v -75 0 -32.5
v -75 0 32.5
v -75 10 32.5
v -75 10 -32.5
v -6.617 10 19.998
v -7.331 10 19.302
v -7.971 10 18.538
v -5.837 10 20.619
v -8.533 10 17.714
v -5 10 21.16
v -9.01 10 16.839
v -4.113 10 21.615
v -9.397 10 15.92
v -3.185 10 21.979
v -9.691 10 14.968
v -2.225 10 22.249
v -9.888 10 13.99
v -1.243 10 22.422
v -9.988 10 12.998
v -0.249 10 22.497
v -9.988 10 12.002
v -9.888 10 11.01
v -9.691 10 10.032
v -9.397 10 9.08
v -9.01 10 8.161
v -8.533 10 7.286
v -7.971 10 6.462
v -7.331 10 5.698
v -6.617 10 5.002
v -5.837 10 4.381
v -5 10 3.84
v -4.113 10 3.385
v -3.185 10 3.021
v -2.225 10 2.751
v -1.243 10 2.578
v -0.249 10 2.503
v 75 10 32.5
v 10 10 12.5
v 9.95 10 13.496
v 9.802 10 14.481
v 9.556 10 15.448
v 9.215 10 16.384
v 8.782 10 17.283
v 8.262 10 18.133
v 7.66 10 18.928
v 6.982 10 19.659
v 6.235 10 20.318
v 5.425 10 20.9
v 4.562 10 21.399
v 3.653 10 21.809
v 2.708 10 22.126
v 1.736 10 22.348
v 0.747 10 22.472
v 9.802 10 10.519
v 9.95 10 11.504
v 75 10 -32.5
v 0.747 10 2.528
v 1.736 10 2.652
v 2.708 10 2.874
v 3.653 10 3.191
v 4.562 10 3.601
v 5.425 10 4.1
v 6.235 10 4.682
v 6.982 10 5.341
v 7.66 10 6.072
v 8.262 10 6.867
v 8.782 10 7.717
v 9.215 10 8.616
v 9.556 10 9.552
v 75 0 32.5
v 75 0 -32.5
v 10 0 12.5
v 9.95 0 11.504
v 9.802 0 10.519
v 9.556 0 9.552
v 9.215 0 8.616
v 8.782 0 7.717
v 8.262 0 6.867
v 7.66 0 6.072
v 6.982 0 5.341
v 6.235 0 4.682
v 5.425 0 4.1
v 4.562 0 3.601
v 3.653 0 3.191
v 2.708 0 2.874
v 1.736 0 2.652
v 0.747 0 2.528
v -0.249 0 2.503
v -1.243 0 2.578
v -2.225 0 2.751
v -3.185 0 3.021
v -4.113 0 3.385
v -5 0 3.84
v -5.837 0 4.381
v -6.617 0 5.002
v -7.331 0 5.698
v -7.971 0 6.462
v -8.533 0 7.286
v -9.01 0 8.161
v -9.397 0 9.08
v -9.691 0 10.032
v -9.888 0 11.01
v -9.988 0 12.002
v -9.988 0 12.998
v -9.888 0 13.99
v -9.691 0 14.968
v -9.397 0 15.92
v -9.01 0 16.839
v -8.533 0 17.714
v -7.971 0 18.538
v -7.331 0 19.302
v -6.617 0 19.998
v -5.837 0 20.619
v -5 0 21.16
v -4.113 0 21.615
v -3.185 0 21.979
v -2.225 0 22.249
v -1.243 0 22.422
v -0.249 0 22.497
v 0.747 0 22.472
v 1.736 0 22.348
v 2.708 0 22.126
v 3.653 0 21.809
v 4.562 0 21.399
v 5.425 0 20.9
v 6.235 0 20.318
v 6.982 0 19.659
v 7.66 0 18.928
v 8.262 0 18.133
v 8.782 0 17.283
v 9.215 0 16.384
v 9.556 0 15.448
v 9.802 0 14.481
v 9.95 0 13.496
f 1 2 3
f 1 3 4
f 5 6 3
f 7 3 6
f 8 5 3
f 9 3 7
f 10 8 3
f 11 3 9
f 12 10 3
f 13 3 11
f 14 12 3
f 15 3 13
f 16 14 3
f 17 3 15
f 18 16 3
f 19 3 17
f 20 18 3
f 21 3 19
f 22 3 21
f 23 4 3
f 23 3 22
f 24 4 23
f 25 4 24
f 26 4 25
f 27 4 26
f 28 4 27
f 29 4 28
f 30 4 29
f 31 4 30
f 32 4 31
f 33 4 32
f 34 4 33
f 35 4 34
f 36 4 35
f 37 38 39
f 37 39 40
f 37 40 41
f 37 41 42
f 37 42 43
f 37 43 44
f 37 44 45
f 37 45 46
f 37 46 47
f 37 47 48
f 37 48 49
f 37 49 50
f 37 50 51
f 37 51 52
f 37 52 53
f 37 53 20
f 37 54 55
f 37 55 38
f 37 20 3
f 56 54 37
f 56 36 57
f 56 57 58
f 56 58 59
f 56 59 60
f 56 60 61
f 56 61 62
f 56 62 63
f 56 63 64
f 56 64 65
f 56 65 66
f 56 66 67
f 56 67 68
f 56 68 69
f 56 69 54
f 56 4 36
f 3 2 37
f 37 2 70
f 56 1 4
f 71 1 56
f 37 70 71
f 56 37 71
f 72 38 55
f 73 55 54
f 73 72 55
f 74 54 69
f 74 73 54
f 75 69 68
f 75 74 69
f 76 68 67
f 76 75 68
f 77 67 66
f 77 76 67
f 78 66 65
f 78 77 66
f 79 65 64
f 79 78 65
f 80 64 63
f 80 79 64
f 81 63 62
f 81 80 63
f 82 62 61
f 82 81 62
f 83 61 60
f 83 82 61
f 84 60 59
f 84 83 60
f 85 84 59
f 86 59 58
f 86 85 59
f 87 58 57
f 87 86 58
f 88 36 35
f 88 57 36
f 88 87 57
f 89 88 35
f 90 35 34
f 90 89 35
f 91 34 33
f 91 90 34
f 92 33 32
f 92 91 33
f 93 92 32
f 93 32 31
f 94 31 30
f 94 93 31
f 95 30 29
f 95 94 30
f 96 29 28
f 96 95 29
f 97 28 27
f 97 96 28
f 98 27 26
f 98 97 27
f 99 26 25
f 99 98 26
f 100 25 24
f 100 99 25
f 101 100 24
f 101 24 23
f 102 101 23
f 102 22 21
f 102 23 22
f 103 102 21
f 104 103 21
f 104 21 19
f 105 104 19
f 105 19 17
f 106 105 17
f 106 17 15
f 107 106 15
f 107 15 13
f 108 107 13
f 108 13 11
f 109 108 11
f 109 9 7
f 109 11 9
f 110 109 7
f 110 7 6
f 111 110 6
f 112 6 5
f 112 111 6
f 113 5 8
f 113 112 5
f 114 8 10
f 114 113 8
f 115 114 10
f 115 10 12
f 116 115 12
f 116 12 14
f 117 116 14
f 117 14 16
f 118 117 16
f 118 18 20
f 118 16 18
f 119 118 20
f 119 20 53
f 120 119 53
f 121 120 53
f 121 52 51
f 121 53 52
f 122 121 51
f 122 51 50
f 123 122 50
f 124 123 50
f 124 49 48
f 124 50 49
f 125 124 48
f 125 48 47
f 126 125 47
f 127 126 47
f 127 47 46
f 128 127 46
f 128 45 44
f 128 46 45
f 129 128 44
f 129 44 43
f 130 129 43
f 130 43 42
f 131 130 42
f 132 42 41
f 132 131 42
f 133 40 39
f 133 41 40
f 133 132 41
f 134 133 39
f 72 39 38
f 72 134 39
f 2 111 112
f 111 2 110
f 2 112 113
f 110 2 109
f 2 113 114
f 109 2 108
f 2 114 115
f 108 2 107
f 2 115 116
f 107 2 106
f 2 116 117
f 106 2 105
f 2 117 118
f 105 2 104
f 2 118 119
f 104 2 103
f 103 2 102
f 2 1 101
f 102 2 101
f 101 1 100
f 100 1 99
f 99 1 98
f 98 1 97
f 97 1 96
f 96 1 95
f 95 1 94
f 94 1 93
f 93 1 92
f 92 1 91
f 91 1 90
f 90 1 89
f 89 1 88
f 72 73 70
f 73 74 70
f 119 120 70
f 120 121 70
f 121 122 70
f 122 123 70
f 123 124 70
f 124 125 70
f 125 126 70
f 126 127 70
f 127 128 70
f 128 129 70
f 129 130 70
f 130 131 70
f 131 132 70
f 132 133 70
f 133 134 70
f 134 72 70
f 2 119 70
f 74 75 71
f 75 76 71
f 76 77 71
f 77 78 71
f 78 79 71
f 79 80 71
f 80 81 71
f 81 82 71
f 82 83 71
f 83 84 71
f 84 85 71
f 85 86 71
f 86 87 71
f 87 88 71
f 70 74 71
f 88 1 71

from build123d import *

# Parameters (mm, degrees)
SKETCH1_W               = 150
SKETCH1_H               = 65
BOSS_EXTRUDE1_DEPTH     = 10
SKETCH2_R               = 10
CUT_EXTRUDE2_DEPTH      = 11
CUT_EXTRUDE2_DEPTH_BACK = 1


with BuildPart() as part:
    # Sketch1 → Boss-Extrude1 (new body)
    with BuildSketch(Plane(origin=(0, 0, 0), x_dir=(1, 0, 0), z_dir=(0, 1, 0))):
        Rectangle(SKETCH1_W, SKETCH1_H)
    extrude(amount=BOSS_EXTRUDE1_DEPTH)

    # Sketch2 → Cut-Extrude2 (cut, two sides)
    with BuildSketch(Plane(origin=(0, 0, 0), x_dir=(1, 0, 0), z_dir=(0, 1, 0))) as cut_extrude2_sk:
        with Locations((0, -12.5)):
            Circle(SKETCH2_R)
    extrude(amount=CUT_EXTRUDE2_DEPTH, mode=Mode.SUBTRACT)
    extrude(cut_extrude2_sk.sketch, amount=-CUT_EXTRUDE2_DEPTH_BACK, mode=Mode.SUBTRACT)


solid = part.part
